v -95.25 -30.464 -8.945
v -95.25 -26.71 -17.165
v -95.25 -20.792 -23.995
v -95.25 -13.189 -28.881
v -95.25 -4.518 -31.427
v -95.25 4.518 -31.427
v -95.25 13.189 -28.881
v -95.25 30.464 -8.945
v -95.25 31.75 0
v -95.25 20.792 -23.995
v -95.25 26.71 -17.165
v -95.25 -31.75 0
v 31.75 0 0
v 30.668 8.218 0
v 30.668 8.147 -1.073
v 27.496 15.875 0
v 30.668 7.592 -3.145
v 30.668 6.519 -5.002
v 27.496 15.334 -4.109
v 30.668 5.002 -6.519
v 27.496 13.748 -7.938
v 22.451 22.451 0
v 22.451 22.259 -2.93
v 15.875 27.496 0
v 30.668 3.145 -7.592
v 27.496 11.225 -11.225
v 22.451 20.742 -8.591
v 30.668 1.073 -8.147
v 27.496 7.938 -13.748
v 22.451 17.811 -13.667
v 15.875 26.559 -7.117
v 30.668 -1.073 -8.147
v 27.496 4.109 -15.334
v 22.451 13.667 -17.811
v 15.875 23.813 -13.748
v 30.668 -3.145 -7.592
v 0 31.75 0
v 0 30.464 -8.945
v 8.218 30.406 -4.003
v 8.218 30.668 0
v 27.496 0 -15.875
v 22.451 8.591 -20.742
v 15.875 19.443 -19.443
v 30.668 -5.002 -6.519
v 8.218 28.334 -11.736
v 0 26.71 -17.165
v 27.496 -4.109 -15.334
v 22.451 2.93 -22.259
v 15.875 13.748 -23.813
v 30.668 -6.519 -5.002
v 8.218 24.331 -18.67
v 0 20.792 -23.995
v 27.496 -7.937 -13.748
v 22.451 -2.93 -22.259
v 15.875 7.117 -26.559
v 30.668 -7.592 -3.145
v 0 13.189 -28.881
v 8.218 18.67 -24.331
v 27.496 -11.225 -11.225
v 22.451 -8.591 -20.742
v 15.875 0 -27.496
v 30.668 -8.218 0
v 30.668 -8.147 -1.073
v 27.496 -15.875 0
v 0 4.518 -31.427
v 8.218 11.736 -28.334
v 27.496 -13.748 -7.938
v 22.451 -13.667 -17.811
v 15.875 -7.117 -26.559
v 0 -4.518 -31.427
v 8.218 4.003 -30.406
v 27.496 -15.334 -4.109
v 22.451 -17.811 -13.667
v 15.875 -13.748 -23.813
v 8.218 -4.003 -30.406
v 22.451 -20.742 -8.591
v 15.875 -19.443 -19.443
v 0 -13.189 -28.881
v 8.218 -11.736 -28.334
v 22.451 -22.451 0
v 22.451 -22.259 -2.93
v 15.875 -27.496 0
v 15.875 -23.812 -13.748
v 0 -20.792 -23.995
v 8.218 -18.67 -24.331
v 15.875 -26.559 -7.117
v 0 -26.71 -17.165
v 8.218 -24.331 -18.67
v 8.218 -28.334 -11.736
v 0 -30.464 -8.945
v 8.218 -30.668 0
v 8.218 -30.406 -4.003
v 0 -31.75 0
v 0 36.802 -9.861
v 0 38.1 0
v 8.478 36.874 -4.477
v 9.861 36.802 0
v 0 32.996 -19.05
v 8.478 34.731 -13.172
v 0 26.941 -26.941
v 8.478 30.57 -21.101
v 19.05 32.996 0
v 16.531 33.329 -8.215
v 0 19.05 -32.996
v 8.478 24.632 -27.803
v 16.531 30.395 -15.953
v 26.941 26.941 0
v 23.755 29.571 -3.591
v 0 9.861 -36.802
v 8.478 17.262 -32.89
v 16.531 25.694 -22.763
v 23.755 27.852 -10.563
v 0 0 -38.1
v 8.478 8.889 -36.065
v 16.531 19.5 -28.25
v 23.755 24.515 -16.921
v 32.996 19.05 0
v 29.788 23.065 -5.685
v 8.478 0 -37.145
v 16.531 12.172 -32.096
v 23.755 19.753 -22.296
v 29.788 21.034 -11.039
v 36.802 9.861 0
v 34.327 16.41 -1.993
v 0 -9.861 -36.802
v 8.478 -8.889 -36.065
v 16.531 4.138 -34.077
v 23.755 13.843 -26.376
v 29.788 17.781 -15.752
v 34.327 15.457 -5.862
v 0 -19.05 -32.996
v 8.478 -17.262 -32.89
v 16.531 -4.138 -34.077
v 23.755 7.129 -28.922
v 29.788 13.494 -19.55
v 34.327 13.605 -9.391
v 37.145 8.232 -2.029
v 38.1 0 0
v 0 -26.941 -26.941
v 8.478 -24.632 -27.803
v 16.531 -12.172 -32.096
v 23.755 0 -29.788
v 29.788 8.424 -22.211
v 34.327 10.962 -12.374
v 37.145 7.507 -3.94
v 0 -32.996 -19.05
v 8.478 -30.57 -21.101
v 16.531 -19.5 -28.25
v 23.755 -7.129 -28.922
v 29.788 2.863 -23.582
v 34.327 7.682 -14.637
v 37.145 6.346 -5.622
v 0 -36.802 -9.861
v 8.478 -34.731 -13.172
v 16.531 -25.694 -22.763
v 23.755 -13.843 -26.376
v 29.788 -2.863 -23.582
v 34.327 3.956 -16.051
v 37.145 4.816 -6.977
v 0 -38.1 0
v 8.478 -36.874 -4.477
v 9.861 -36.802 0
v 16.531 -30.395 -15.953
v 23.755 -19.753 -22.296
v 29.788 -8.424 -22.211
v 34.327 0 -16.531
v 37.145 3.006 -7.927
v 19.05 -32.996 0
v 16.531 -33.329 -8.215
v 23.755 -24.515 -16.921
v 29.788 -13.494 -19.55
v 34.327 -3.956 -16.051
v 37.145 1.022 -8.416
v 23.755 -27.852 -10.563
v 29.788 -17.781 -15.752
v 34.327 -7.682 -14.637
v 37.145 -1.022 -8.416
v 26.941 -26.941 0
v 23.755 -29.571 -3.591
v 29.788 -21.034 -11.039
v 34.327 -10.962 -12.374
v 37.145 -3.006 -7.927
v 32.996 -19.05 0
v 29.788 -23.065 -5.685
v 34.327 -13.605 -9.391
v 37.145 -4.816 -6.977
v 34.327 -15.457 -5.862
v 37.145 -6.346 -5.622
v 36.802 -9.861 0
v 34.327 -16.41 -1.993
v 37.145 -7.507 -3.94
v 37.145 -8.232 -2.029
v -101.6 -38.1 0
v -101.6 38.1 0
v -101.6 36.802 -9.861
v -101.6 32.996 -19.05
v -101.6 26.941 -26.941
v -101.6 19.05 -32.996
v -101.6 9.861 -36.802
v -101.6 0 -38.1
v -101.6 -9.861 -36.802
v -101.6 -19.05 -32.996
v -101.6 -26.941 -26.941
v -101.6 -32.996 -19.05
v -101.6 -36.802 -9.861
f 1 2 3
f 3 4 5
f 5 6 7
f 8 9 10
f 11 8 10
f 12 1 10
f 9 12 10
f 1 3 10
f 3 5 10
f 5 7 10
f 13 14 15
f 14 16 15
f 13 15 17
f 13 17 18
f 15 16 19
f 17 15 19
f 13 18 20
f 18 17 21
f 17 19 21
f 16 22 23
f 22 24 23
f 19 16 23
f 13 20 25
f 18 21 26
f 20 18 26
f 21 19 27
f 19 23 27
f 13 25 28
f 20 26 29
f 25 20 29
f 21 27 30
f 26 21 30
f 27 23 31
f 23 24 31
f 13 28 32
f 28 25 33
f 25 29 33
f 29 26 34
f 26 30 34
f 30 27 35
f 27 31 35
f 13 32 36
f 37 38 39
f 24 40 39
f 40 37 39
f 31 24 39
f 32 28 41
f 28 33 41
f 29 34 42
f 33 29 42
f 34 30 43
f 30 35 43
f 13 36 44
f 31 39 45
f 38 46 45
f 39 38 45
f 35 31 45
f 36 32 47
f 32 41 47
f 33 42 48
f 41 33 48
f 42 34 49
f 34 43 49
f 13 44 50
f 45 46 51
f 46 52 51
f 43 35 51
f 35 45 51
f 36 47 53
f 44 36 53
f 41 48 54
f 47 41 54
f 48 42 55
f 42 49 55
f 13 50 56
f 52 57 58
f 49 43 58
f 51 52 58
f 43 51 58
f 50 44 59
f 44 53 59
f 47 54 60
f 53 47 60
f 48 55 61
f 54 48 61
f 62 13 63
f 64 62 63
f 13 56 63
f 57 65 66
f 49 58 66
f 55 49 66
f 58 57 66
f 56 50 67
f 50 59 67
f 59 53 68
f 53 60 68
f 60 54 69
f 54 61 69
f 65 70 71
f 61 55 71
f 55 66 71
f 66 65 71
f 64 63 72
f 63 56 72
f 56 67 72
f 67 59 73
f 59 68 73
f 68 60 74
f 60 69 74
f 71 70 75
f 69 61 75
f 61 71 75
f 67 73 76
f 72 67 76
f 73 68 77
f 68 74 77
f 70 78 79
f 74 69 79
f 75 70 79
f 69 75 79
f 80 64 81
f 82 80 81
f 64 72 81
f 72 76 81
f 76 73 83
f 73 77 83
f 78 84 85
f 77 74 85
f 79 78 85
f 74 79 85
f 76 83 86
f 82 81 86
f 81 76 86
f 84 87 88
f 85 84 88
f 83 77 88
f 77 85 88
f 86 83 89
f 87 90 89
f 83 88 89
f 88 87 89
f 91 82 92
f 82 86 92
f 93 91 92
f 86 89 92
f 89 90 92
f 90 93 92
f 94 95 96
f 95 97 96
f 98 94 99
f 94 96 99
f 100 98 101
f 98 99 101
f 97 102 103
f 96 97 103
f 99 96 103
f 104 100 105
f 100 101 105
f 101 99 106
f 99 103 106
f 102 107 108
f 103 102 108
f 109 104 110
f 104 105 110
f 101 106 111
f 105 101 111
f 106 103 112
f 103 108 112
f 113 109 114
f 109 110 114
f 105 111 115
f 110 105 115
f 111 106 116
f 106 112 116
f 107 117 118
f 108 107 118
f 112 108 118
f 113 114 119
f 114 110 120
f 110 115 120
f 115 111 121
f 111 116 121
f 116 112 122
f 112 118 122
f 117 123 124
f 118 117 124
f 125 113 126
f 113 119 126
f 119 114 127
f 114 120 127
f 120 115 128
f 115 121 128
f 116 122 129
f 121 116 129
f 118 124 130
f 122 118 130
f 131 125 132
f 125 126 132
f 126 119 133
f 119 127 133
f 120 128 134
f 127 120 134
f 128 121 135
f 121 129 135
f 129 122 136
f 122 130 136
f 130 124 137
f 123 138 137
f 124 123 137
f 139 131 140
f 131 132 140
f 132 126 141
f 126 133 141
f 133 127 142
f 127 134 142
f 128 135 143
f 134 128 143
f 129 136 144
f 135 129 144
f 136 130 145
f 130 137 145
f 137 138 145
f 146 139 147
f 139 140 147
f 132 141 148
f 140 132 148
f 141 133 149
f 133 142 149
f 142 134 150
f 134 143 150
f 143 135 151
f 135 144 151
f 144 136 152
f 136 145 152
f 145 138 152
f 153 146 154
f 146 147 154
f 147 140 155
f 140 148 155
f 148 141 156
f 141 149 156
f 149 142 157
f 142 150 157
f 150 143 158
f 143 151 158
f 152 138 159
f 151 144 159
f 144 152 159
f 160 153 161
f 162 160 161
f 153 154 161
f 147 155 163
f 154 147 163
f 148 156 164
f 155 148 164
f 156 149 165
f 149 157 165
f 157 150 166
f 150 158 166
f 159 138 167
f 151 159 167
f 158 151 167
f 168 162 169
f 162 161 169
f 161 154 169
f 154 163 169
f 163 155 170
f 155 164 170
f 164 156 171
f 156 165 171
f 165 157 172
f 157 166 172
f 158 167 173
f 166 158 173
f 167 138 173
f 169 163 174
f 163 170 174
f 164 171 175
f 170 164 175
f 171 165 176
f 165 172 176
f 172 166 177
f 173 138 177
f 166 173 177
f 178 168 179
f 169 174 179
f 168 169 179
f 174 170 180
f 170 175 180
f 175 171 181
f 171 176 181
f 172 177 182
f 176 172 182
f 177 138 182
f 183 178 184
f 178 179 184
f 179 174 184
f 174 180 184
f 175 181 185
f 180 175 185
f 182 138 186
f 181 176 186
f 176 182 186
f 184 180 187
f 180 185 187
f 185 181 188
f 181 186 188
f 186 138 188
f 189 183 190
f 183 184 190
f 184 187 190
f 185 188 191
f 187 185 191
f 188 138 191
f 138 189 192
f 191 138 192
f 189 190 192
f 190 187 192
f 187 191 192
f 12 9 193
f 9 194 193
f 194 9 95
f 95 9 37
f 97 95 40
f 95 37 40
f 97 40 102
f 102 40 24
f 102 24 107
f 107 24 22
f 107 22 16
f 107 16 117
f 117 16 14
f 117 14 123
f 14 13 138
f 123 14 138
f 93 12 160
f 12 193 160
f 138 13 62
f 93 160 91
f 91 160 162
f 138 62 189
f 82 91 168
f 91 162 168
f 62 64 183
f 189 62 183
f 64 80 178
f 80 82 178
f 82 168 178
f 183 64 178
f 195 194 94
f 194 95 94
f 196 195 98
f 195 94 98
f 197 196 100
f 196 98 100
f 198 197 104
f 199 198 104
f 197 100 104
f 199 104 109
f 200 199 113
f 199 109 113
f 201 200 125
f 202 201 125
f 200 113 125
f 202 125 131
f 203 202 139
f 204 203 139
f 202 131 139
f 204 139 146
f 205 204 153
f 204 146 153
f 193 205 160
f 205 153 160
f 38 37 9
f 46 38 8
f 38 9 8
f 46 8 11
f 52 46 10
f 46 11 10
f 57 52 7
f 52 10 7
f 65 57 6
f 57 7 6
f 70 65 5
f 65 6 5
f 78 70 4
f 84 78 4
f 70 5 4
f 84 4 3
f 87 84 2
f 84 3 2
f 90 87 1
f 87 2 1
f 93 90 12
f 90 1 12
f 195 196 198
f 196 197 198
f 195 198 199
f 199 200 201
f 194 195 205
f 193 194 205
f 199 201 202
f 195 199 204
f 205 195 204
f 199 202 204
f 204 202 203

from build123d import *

# Parameters (mm, degrees)
F1_ANGLE_BACK = 90
F1_ANGLE      = 180


with BuildPart() as f1:
    # F0 (on Front) → F1 (revolve)
    with BuildSketch(Plane.XZ, mode=Mode.PRIVATE) as f1_sk:
        Polygon((-95.25, -31.75), (-95.25, 0), (-101.6, 0), (-101.6, -38.1), (0, -38.1), (0, -31.75), align=None)
        with BuildLine():
            ThreePointArc((31.75, 0), (22.4506403027, -22.4506403027), (0, -31.75))
            Line((0, -31.75), (0, -38.1))
            ThreePointArc((0, -38.1), (26.9407683632, -26.9407683632), (38.1, 0))
            Line((38.1, 0), (31.75, 0))
        make_face()
    revolve(f1_sk.sketch.rotate(Axis((-50.8, 0, 0), (-1, 0, 0)), -F1_ANGLE_BACK), axis=Axis((-50.8, 0, 0), (-1, 0, 0)), revolution_arc=F1_ANGLE)


solid = f1.part
